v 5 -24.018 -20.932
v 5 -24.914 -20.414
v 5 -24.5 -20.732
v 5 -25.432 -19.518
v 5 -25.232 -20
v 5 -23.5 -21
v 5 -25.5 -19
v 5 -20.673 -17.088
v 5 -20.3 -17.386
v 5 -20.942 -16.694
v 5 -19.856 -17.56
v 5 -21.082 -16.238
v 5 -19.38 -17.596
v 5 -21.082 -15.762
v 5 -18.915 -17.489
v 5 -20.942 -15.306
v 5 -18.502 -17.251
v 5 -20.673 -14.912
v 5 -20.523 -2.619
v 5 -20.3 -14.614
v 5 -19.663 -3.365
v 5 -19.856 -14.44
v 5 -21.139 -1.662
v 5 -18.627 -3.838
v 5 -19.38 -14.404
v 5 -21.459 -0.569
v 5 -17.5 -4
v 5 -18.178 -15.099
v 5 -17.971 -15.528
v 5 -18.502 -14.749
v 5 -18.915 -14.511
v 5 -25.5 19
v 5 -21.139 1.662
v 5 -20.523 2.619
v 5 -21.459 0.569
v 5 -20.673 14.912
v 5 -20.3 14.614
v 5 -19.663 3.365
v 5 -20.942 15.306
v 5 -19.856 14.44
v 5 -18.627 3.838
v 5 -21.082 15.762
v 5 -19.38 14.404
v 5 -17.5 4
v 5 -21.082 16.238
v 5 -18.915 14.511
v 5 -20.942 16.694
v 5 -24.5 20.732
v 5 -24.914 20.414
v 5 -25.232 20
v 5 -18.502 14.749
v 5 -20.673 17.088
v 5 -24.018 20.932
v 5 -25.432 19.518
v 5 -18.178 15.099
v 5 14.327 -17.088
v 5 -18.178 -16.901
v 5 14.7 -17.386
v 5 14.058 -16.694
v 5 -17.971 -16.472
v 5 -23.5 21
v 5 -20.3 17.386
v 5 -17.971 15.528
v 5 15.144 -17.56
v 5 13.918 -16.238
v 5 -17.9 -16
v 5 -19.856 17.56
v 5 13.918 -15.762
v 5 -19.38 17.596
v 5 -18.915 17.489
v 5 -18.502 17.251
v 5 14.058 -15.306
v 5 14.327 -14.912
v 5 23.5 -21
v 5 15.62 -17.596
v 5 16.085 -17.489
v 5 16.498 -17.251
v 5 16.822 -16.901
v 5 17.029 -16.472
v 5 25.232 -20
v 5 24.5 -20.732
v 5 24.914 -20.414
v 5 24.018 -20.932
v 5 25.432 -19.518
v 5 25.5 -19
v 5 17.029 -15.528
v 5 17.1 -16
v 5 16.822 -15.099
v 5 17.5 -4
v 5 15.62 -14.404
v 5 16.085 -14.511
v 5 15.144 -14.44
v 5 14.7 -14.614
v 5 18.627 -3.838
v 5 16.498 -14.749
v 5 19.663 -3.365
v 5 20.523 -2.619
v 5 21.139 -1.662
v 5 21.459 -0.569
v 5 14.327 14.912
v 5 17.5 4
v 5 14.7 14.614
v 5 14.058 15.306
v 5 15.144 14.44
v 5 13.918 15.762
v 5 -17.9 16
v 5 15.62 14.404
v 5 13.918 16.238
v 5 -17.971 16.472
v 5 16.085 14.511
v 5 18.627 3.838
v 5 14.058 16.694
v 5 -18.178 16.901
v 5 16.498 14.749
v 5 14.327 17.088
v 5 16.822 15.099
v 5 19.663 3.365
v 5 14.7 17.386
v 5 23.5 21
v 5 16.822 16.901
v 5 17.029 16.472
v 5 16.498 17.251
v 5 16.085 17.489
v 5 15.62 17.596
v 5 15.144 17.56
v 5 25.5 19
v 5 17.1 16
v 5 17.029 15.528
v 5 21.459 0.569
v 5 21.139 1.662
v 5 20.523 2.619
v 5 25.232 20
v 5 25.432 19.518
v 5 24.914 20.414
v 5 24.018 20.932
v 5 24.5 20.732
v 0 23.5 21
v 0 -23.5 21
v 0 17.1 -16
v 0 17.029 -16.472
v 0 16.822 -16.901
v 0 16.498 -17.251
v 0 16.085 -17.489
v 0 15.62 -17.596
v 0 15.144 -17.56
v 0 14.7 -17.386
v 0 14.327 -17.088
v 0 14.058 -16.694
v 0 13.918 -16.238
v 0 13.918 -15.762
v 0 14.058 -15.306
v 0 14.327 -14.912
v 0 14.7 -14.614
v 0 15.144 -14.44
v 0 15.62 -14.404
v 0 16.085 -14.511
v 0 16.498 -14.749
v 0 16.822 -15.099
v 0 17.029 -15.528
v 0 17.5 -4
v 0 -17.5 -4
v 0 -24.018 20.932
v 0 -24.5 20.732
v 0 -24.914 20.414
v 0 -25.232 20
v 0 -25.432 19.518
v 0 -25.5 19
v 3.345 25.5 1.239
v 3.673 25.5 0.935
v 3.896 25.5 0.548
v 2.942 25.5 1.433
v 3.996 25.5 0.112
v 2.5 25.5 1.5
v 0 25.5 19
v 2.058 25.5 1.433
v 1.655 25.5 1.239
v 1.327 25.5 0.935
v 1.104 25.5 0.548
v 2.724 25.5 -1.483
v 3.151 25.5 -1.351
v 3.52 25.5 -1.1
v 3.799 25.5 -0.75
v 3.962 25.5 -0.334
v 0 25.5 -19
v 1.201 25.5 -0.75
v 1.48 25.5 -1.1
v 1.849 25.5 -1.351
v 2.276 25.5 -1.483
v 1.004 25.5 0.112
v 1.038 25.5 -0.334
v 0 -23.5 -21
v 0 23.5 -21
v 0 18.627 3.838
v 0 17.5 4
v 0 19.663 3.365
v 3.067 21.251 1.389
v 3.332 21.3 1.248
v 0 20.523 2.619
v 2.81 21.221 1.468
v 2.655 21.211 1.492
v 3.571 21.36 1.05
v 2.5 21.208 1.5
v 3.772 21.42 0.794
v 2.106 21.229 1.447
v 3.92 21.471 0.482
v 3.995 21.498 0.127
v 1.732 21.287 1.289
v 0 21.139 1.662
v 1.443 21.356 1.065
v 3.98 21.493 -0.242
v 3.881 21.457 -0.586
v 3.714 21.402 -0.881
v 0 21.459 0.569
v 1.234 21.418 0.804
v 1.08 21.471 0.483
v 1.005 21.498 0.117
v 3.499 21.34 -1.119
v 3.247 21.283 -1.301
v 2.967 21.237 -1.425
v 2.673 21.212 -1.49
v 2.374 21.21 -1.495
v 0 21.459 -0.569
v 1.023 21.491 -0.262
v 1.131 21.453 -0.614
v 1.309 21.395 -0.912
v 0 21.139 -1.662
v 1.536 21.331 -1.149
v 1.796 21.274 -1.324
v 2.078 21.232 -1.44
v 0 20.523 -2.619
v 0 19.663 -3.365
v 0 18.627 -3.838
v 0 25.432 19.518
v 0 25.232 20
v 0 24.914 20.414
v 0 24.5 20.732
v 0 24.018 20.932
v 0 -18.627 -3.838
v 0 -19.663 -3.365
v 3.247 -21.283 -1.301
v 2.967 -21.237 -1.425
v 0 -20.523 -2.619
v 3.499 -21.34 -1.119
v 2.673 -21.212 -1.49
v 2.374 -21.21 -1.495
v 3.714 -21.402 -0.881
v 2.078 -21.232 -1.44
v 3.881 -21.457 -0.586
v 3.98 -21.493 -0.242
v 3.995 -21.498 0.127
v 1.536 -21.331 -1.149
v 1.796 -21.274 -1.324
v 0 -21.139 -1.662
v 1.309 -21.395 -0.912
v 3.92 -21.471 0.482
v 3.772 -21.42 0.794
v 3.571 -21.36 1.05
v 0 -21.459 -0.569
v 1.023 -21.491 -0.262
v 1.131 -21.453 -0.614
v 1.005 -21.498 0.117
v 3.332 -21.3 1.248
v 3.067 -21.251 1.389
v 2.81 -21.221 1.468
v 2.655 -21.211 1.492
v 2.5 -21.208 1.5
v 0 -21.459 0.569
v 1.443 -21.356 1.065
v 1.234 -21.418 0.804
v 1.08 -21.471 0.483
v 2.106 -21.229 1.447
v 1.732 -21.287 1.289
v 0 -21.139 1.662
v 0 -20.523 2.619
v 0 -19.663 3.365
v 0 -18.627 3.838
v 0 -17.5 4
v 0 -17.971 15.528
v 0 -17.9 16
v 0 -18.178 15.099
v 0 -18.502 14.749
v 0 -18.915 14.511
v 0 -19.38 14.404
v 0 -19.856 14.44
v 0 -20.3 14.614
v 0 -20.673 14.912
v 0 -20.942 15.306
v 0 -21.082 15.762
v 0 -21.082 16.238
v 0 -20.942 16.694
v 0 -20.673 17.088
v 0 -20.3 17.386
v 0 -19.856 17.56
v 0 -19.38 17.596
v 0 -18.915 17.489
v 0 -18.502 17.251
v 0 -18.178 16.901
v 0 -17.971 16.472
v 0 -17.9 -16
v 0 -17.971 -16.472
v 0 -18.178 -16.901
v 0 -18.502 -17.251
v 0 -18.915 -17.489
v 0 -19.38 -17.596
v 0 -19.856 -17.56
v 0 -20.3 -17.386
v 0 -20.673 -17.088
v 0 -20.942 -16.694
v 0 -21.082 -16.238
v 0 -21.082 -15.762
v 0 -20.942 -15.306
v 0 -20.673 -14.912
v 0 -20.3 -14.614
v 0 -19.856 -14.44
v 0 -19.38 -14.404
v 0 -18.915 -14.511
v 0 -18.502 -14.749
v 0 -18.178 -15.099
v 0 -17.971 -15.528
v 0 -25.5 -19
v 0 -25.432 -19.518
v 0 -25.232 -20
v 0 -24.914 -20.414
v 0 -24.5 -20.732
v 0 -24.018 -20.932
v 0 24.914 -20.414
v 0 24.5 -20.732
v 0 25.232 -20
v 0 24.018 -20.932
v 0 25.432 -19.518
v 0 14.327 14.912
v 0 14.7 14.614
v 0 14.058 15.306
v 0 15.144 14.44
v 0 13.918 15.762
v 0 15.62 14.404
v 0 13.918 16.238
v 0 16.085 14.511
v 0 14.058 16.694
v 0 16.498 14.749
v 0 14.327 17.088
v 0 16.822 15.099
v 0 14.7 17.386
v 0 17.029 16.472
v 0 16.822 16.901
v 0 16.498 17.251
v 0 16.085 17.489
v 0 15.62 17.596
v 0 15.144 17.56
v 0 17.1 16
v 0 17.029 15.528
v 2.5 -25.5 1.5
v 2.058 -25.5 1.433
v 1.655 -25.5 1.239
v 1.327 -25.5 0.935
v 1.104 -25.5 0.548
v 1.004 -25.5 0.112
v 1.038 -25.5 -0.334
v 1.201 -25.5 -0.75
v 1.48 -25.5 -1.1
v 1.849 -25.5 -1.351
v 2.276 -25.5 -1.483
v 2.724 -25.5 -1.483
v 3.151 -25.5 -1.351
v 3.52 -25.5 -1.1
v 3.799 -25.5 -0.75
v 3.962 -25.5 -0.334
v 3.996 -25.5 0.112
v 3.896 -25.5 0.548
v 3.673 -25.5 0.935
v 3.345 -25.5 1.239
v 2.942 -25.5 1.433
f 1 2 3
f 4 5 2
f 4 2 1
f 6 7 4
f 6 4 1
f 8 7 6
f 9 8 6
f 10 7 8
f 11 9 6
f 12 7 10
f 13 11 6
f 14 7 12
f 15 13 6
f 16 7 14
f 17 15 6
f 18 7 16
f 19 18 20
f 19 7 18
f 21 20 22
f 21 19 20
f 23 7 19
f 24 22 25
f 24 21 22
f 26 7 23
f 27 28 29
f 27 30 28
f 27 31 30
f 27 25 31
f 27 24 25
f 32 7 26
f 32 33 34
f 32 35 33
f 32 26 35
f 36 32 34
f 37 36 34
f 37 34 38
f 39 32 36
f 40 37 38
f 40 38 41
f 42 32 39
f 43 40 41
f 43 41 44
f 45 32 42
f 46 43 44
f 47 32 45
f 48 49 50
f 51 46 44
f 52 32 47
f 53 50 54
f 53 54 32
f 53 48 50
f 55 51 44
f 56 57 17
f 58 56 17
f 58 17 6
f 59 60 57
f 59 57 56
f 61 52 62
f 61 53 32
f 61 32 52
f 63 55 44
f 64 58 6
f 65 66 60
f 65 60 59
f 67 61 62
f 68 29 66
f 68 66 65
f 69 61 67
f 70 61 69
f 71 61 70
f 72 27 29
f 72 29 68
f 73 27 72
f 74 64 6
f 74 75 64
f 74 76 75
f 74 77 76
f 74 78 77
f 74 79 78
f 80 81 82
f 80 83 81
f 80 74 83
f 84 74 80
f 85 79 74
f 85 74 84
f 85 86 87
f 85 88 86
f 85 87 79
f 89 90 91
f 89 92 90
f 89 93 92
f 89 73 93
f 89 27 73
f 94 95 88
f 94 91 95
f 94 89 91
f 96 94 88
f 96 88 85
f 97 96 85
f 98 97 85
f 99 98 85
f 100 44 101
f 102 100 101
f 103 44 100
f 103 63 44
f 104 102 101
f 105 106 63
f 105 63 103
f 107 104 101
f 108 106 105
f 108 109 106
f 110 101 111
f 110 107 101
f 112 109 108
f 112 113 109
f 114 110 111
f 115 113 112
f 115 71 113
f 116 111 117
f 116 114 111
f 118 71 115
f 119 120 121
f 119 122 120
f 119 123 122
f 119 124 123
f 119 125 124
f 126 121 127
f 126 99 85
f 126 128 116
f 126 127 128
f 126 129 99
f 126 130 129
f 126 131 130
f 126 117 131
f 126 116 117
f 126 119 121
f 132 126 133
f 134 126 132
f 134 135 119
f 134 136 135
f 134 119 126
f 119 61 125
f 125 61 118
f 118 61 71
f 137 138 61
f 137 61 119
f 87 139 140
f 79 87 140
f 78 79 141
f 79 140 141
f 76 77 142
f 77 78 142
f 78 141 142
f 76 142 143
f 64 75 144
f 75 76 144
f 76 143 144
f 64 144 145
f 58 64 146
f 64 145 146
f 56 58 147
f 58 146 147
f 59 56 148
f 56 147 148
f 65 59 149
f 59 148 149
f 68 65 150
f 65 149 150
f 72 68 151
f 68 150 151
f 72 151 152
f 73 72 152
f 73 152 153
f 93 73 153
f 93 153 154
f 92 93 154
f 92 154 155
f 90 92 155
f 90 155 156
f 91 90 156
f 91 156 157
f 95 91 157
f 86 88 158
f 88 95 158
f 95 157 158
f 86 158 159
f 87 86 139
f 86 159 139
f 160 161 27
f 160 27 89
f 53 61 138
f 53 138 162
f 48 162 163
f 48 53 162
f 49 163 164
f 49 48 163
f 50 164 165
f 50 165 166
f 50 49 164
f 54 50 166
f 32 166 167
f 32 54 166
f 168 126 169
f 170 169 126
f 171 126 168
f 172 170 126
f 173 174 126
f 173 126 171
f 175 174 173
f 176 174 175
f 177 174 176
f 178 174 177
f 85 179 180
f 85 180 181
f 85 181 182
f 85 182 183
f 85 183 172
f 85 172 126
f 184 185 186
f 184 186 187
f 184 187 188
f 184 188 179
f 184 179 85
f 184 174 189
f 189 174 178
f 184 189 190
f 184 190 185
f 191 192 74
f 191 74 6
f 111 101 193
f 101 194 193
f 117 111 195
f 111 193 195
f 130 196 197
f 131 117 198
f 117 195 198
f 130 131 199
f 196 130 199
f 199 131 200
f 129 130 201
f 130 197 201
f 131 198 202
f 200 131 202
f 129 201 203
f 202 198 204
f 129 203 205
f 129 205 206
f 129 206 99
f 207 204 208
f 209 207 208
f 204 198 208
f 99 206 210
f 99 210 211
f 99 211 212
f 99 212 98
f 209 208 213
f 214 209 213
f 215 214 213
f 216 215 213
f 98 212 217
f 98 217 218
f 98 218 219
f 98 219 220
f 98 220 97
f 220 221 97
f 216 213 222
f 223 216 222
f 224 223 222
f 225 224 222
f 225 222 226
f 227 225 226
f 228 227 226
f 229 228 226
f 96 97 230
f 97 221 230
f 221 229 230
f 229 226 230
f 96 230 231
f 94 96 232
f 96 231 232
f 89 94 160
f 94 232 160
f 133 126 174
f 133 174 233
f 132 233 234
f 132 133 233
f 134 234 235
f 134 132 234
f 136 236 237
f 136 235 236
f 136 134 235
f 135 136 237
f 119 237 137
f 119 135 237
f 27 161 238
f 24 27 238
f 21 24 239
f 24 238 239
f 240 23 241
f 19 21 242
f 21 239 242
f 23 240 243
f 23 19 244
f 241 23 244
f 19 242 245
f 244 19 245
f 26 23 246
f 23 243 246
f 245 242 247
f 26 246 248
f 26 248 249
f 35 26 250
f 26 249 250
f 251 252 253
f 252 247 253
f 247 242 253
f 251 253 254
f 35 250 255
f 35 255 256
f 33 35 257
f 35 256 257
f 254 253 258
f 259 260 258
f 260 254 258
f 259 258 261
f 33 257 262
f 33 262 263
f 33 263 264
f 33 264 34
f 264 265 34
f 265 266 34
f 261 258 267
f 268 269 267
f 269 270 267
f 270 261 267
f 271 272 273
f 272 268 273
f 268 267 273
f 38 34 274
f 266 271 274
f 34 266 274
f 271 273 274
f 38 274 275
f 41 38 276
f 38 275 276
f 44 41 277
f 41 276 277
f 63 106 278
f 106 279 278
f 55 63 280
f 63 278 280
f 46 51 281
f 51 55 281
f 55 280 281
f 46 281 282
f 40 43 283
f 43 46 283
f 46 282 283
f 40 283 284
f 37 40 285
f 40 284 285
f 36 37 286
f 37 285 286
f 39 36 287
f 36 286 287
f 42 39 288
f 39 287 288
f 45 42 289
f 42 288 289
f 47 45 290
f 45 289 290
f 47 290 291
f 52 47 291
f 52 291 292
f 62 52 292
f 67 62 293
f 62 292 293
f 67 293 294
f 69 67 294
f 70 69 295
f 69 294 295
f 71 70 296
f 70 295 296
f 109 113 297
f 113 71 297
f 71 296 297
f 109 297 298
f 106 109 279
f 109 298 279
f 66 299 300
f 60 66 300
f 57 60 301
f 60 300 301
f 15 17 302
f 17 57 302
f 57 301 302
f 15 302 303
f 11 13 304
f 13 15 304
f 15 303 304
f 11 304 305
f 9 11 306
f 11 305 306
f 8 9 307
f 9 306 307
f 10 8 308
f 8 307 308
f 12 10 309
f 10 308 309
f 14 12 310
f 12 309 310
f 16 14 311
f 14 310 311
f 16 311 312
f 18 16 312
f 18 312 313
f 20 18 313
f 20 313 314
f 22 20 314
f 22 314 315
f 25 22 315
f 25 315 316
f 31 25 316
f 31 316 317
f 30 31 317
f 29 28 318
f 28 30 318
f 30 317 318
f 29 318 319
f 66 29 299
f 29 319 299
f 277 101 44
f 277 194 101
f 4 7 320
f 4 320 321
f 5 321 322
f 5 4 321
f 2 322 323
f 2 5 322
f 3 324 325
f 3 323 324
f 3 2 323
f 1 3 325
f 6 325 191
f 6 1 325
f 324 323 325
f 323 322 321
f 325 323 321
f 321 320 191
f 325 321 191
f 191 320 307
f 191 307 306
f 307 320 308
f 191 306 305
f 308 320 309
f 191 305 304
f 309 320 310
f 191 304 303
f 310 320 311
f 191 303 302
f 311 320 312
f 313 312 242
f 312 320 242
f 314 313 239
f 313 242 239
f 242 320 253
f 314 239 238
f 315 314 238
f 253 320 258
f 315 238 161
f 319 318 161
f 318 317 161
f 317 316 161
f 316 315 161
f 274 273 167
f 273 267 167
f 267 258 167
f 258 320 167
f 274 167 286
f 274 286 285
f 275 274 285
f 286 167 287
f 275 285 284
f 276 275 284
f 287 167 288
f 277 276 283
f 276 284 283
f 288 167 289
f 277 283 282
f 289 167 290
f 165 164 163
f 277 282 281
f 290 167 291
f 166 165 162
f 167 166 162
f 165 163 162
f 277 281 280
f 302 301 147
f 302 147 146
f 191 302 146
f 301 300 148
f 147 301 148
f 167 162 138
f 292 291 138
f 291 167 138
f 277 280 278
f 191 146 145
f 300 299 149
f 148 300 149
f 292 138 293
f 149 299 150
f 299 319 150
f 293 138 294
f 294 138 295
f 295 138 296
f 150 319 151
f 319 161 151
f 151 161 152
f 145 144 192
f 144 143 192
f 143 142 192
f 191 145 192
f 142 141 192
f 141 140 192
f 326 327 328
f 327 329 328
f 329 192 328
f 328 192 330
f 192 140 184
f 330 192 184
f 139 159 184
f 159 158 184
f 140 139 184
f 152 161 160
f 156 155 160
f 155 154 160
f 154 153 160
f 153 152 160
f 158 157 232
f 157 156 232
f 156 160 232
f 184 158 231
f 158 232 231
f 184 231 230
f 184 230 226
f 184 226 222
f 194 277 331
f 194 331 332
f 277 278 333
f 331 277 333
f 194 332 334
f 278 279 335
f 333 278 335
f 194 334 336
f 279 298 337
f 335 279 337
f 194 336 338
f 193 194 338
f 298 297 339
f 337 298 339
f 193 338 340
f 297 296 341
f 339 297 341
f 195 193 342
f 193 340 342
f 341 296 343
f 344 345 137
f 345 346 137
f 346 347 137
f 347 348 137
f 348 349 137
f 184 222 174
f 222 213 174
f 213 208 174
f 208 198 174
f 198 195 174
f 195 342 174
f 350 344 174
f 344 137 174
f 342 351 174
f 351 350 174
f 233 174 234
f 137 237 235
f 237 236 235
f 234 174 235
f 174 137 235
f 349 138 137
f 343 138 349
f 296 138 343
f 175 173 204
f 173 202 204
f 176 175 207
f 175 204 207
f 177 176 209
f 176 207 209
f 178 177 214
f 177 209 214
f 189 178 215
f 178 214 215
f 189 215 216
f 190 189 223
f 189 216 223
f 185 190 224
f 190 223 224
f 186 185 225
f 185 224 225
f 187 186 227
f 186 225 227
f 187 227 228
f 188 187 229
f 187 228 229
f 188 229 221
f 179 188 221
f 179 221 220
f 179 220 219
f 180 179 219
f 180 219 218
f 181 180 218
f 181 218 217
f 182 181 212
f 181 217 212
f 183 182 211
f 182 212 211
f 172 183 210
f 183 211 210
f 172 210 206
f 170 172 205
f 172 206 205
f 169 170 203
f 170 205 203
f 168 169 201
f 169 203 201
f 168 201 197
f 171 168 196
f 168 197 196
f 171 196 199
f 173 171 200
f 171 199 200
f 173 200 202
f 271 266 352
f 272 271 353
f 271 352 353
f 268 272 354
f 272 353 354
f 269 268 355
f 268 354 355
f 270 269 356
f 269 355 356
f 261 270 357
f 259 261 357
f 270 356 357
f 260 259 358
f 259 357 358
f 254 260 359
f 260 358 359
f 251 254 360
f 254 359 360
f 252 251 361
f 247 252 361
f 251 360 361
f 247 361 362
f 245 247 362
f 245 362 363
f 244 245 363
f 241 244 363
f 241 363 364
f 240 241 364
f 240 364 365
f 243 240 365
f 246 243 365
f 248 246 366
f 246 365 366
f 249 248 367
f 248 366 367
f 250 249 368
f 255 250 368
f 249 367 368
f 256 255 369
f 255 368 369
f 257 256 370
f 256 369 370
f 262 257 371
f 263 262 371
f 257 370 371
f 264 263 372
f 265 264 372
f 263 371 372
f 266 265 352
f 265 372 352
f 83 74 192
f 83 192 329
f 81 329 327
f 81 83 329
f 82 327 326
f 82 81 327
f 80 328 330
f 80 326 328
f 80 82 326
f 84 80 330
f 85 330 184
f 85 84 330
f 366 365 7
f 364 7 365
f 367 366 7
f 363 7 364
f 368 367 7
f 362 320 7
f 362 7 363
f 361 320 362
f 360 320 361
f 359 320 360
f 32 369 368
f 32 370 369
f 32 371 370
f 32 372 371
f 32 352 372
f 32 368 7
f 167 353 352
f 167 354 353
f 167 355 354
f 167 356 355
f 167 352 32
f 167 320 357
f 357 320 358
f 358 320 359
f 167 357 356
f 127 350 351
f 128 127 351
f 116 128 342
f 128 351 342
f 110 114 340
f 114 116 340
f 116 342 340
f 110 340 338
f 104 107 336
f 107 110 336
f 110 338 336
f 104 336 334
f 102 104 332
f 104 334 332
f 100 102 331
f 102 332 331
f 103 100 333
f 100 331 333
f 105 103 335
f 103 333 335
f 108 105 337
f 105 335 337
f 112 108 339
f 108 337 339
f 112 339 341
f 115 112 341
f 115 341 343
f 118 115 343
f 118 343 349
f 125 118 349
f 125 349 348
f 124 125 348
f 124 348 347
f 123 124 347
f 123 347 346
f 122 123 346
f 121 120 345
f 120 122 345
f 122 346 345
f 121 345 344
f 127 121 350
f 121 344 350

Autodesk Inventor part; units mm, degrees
ref_plane "YZ Plane" through (0, 0, 0) normal (1, 0, 0) x (0, 1, 0)
ref_plane "XZ Plane" through (0, 0, 0) normal (0, 1, 0) x (-1, 0, 0)
ref_plane "XY Plane" through (0, 0, 0) normal (0, 0, 1) x (1, 0, 0)
sketch "Sketch1" plane through (0, 0, 0) normal (1, 0, 0) x (0, 1, 0)
  line L0 (-25.5, 21) -> (25.5, 21)
  line L1 (25.5, 21) -> (25.5, -21)
  line L2 (25.5, -21) -> (-25.5, -21)
  line L3 (-25.5, -21) -> (-25.5, 21)
  line L4 (-25.5, 21) -> (25.5, -21) construction
  line L5 (25.5, 21) -> (-25.5, -21) construction
  circle A0 centre (15.5, 16) radius 1.6
  circle A1 centre (15.5, -16) radius 1.6
  circle A2 centre (-19.5, -16) radius 1.6
  circle A3 centre (-19.5, 16) radius 1.6
  line L6 (17.5, 0) -> (-17.5, 0) construction
  line L7 (17.5, 4) -> (-17.5, 4)
  line L8 (-17.5, -4) -> (17.5, -4)
  arc A4 (17.5, -4) -> (17.5, 4) centre (17.5, 0) ccw
  arc A5 (-17.5, 4) -> (-17.5, -4) centre (-17.5, 0) ccw
  point P0 (0, 0)
  point P1 (-9.5, -16)
  point P2 (0, 0)
  point P3 (15.5, -48)
  point P4 (-19.5, -35.5845)
  dimension "d0" = 42
  dimension "d1" = 51
  dimension "d2" = 5
  dimension "d3" = 10
  dimension "d5" = 35
  dimension "d6" = 5
  dimension "d7" = 3.2
  dimension "d8" = 3.2
  dimension "d9" = 3.2
  dimension "d10" = 3.2
  dimension "d15" = 0
  dimension "d16" = 0
  dimension "d17" = 32
  dimension "d18" = 0
  dimension "d19" = 0
  dimension "d20" = 8
  dimension "d21" = 8
  dimension "d22" = 8
  dimension "d31" = 32
extrude "Extrusion1" add sketch "Sketch1" along normal blind 5
fillet "Fillet1" radius 2 4 edges at (2.5, 25.5, 21) (2.5, -25.5, 21) (2.5, -25.5, -21) (2.5, 25.5, -21)
sketch "Sketch2" plane through (0, 25.5, 19) normal (0, 1, 0) x (1, 0, 0)
  line L0 (0, 38) -> (0, 0) projected
  point P0 (0, 19)
  point P1 (2.5, 19)
  dimension "d23" = 2.5
hole "Hole1" at (2.5, 25.5, 0) direction (0, -1, 0) diameter 3 depth 80.45
properties part number "2mm_double_for_pulley" material "アルミニウム 6061"
